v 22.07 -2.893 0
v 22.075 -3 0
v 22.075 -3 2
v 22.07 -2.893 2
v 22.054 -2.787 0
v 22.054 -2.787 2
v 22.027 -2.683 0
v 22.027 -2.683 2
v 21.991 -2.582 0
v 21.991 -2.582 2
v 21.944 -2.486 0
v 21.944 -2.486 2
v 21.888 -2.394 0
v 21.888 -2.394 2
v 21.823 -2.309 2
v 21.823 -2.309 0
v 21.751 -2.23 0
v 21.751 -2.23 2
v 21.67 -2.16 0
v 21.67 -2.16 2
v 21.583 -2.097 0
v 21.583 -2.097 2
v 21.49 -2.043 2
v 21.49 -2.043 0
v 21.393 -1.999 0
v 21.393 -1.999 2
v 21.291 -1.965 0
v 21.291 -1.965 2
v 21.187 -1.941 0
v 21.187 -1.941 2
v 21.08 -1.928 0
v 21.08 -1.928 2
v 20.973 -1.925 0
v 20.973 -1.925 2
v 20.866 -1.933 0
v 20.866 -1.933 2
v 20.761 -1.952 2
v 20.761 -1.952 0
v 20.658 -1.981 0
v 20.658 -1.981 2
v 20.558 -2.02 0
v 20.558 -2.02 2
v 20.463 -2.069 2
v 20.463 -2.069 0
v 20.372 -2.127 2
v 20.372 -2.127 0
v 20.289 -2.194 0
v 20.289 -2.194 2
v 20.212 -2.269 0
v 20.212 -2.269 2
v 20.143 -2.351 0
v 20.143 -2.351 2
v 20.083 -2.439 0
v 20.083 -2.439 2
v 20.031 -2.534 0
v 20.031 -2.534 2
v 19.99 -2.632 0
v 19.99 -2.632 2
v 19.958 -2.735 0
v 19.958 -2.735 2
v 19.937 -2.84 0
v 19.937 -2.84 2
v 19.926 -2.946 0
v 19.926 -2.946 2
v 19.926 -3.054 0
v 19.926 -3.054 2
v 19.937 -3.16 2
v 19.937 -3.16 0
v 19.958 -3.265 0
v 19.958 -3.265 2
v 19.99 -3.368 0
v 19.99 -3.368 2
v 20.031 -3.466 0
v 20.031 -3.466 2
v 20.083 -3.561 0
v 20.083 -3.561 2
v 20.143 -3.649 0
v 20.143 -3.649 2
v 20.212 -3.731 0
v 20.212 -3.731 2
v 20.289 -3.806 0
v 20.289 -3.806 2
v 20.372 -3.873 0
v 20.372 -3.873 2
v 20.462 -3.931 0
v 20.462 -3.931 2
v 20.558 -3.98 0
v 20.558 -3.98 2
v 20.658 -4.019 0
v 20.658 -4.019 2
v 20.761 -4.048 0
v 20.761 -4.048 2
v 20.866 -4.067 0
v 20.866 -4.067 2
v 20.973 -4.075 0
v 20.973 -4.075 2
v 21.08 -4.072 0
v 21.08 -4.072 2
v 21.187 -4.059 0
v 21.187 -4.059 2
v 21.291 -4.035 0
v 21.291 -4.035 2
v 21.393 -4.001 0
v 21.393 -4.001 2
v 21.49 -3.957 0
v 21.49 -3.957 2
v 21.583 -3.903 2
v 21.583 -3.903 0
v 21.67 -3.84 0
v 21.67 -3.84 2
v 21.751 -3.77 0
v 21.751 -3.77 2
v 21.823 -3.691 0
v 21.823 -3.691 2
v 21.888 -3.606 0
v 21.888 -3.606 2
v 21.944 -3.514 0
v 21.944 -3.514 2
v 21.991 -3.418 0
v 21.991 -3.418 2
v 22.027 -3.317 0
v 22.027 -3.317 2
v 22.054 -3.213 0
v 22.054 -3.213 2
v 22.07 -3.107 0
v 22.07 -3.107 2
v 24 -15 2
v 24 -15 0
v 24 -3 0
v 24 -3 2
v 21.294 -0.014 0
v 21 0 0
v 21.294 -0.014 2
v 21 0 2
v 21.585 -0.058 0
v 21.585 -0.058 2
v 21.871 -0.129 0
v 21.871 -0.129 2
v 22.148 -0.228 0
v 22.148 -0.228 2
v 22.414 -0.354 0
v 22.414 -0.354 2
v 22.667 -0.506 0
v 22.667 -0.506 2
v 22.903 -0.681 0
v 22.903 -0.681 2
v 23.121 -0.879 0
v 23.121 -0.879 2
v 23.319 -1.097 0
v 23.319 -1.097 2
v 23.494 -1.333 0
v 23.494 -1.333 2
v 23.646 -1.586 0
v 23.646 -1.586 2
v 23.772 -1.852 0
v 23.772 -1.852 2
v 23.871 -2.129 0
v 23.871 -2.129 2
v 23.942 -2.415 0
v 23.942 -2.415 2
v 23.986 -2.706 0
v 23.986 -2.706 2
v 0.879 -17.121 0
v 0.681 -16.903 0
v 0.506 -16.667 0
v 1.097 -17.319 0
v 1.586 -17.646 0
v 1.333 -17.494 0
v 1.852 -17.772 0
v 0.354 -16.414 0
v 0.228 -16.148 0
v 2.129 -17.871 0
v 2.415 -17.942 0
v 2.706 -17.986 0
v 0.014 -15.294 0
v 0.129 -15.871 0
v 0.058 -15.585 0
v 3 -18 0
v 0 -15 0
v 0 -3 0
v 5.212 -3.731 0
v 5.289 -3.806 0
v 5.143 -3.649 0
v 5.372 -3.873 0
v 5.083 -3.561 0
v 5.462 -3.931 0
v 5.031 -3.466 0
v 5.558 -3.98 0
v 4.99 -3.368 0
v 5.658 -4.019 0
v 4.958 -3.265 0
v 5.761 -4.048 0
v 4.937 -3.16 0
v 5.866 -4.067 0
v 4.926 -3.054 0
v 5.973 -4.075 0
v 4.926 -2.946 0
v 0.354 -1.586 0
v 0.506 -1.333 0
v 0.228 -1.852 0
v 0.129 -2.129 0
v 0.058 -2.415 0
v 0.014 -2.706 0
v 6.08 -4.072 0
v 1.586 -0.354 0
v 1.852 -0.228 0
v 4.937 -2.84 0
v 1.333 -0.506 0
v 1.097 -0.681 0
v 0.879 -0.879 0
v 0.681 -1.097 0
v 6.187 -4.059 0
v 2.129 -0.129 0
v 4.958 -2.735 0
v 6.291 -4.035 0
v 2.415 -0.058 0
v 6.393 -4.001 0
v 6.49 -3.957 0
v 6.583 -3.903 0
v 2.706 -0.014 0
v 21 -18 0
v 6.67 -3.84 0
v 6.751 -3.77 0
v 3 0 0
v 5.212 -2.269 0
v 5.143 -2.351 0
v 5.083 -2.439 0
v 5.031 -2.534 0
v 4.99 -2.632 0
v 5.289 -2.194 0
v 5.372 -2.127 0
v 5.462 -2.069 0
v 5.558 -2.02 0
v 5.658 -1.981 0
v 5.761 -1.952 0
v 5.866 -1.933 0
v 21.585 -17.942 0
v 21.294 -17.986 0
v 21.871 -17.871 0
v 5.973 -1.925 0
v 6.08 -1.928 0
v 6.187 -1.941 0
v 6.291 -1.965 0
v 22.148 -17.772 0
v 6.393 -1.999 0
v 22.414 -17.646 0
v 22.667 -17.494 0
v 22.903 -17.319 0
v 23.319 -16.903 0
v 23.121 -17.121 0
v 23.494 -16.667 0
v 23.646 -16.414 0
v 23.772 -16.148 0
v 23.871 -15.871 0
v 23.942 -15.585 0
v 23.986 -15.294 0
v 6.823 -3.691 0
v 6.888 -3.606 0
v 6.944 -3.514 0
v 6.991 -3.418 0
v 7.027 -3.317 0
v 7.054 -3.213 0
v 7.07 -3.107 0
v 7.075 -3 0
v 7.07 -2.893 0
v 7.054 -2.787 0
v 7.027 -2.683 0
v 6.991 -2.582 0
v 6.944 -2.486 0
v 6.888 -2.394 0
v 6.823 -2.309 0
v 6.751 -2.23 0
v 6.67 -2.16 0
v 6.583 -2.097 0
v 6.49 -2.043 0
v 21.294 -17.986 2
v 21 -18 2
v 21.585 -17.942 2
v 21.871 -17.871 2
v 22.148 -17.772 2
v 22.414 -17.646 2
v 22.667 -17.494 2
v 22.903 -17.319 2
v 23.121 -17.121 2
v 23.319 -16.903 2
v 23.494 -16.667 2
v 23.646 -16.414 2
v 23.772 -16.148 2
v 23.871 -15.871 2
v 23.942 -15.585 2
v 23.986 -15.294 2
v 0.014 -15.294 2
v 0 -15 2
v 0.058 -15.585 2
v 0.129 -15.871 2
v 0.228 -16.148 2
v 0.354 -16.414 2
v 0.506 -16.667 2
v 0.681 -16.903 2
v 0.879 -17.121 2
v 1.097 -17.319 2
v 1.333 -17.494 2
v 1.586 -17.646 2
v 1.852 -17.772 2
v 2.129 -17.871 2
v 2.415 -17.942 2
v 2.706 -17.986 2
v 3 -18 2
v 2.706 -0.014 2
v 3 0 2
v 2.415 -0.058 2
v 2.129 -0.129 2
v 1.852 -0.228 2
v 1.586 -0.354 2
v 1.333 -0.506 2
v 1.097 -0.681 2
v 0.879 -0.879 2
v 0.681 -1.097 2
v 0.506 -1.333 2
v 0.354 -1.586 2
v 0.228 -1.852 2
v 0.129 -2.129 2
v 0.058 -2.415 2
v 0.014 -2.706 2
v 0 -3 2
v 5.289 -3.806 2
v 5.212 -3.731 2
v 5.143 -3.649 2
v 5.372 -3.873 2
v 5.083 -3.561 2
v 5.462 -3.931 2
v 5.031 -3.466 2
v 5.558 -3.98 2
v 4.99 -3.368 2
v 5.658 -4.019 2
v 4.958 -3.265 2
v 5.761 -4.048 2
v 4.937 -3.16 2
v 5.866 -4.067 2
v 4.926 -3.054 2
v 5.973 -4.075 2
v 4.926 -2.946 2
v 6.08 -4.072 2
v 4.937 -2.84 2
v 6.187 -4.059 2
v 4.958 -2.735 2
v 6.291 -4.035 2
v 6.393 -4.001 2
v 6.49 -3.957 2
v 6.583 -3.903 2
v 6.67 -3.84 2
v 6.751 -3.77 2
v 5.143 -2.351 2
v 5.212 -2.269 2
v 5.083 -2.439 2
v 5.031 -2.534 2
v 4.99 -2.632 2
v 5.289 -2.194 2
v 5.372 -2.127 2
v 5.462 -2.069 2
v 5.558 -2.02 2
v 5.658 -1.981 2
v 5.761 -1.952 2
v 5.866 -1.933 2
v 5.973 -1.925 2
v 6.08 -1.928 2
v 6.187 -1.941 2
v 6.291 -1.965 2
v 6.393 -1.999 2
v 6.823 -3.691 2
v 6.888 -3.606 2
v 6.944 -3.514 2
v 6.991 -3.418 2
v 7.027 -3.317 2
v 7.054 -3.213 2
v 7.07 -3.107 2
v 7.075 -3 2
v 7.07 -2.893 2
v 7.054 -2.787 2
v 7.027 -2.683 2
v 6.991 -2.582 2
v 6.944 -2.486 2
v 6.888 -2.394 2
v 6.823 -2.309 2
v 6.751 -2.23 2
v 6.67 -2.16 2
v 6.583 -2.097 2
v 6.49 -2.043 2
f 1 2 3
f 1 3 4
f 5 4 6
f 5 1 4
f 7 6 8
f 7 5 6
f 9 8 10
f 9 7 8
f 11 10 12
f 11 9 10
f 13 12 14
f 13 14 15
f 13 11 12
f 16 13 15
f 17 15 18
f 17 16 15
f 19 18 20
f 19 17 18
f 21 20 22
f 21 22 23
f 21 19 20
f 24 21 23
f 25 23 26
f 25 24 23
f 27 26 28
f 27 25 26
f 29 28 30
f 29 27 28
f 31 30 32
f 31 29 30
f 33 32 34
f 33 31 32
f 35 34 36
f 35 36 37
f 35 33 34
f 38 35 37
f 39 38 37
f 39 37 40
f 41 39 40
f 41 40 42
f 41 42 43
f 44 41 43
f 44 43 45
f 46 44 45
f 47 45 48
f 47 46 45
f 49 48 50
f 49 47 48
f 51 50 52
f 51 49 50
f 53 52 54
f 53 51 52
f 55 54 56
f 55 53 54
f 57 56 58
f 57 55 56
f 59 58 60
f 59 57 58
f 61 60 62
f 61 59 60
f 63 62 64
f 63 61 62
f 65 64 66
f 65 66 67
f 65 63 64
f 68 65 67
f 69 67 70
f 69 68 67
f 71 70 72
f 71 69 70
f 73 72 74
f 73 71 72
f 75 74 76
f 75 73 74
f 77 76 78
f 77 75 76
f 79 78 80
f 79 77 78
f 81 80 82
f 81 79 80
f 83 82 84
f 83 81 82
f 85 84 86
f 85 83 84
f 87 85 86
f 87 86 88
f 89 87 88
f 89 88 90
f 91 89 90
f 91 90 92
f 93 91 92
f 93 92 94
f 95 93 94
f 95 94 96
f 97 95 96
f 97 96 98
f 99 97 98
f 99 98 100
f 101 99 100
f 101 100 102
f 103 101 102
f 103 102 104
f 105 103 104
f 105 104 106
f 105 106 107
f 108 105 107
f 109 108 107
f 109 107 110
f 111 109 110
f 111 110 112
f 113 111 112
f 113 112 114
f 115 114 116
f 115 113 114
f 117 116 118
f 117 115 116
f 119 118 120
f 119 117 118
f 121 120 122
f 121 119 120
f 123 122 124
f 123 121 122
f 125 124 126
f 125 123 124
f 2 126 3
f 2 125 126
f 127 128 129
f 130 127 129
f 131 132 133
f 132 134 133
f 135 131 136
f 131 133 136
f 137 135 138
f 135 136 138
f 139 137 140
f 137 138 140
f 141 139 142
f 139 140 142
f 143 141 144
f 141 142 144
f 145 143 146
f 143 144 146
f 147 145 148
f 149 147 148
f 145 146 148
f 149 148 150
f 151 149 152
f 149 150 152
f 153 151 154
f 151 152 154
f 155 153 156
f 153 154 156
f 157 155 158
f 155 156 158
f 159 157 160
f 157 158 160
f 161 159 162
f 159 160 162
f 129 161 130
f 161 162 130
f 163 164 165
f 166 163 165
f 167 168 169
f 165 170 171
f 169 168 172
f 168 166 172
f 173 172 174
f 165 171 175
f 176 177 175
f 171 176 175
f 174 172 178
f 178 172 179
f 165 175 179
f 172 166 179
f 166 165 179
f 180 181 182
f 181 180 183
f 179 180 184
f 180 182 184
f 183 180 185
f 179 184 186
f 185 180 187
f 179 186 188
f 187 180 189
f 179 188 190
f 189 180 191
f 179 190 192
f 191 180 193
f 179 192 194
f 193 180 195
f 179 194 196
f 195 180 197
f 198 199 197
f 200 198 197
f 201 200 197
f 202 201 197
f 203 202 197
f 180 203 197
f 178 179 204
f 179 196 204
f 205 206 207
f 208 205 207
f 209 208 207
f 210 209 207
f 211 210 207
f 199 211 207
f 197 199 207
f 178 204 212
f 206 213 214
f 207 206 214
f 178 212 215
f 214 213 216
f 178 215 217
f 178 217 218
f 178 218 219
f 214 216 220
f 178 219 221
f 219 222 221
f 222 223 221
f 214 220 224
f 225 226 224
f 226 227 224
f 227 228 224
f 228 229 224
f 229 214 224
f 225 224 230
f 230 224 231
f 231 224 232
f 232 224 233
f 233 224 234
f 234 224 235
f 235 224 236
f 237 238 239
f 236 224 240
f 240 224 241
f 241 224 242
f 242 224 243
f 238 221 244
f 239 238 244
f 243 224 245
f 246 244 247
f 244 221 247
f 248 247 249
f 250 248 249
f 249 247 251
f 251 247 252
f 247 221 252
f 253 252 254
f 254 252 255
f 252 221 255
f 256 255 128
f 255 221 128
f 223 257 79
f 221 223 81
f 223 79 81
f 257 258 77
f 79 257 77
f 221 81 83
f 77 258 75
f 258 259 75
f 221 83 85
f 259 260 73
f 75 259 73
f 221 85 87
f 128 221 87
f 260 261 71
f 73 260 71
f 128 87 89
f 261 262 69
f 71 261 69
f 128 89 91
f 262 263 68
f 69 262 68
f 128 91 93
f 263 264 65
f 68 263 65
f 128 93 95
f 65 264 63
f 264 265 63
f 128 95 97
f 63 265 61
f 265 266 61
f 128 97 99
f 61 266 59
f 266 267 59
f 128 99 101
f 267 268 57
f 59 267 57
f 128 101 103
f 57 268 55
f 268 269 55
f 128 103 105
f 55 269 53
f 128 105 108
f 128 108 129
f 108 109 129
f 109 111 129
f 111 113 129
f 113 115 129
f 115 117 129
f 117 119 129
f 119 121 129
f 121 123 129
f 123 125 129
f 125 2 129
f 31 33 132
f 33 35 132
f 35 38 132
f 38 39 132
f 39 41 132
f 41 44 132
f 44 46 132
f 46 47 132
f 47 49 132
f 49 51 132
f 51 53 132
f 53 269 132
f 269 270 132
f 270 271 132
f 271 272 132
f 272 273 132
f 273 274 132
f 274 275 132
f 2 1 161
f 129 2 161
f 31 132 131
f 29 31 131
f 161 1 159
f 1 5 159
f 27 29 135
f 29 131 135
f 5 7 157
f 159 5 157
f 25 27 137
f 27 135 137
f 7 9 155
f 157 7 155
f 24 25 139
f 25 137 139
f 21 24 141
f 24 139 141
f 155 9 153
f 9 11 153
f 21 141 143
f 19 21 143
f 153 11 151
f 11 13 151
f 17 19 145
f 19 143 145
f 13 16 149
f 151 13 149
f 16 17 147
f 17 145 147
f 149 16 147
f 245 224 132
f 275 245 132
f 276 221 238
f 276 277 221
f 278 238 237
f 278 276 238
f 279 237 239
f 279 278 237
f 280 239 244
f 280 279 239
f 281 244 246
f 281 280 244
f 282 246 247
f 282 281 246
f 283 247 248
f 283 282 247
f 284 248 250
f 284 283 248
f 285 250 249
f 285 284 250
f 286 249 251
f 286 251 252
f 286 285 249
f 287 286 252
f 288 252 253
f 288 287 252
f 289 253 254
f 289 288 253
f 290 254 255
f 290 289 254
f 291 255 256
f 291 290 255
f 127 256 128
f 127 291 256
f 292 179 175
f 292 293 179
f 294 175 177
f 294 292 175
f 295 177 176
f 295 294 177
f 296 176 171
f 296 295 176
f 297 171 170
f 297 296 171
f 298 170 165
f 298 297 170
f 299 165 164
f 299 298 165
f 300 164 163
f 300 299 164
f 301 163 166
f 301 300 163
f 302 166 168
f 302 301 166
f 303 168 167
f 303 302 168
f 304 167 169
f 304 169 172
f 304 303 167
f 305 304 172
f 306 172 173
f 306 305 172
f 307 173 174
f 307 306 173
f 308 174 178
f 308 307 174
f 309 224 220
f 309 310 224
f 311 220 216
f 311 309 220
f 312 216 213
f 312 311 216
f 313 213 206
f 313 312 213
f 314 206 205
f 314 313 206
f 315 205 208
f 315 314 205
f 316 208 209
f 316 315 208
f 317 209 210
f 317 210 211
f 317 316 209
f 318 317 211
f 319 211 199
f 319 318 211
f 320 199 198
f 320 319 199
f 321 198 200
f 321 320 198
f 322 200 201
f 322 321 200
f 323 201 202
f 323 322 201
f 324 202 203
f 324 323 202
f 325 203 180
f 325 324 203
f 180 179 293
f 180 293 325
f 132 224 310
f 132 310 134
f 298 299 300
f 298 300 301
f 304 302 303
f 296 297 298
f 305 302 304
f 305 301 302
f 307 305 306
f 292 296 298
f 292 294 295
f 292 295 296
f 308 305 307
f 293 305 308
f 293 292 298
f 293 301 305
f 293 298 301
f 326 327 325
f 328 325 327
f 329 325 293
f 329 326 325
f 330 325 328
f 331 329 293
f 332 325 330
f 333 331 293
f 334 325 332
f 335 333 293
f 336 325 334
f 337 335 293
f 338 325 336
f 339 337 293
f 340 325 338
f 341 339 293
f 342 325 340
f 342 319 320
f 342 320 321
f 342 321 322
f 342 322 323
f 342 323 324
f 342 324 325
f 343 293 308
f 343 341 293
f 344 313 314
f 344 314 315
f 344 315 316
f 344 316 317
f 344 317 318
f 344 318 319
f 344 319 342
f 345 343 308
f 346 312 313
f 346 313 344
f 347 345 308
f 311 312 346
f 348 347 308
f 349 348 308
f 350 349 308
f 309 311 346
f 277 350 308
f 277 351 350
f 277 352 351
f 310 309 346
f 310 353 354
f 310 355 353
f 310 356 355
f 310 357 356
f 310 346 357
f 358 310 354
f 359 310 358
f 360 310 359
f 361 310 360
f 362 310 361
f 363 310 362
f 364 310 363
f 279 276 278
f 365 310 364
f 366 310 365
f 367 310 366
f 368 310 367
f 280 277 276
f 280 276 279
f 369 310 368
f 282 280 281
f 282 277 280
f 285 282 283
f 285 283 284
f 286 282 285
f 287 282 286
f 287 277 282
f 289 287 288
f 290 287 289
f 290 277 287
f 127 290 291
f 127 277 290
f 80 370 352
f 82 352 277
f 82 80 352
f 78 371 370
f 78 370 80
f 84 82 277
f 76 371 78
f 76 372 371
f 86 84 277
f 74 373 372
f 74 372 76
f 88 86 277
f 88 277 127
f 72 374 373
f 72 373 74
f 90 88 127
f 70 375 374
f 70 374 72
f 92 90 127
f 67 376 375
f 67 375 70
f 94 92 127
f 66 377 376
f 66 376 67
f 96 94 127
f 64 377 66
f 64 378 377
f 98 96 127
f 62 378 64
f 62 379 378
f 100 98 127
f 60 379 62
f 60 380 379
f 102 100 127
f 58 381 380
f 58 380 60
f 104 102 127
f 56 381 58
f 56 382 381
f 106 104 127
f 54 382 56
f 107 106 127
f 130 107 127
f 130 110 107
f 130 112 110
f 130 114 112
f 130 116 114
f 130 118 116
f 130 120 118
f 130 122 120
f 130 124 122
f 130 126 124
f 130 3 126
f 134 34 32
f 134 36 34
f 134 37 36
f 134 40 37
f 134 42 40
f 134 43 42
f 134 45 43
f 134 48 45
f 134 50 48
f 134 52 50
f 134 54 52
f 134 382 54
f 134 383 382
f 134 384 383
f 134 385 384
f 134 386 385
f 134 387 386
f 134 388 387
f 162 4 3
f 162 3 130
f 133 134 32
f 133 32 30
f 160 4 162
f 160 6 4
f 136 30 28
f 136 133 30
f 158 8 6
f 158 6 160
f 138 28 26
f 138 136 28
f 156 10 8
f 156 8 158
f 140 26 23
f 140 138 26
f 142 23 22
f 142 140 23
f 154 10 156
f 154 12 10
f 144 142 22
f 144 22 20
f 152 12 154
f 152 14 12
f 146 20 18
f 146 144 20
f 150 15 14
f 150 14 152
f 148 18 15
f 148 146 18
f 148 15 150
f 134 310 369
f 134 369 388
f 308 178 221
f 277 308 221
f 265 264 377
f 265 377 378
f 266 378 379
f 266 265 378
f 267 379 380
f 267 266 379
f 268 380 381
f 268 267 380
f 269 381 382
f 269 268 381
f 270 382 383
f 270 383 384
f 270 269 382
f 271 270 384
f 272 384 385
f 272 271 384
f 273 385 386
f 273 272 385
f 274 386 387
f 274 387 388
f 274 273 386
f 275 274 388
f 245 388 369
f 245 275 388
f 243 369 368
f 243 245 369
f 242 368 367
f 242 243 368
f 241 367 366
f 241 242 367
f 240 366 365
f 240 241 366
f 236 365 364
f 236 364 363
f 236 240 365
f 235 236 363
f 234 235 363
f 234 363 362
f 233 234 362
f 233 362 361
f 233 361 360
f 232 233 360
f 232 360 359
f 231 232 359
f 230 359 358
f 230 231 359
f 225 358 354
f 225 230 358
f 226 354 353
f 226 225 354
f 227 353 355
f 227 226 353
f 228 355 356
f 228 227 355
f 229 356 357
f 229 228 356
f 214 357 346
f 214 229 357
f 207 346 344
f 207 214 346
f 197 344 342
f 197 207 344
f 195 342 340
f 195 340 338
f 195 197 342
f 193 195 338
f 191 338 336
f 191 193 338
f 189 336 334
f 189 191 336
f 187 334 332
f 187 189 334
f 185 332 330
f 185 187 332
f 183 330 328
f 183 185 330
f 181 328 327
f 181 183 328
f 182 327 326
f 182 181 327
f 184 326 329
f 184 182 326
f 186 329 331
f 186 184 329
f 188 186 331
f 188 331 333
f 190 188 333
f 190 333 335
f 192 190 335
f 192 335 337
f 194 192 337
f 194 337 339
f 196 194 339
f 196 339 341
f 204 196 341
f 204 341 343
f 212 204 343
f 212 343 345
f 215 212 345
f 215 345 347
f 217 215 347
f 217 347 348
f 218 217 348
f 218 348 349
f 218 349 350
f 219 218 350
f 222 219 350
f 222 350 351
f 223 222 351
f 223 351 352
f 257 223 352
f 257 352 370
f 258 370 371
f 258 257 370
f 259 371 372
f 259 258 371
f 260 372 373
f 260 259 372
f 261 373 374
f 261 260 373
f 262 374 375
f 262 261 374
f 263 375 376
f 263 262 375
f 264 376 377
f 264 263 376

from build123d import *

# Parameters (mm, degrees)
SKETCH_1_W      = 24
SKETCH_1_H      = 18
SKETCH_1_R      = 1.075
EXTRUDE_1_DEPTH = 2
FILLET_1_R      = 3
FILLET_2_R      = 3
FILLET_3_R      = 3
FILLET_4_R      = 3


with BuildPart() as part:
    # 草图1 → 凸台-拉伸1 (new body)
    with BuildSketch(Plane.XY):
        with Locations((12, -9)):
            Rectangle(SKETCH_1_W, SKETCH_1_H)
        with Locations((21, -3)):
            Circle(SKETCH_1_R, mode=Mode.SUBTRACT)
        with Locations((6, -3)):
            Circle(SKETCH_1_R, mode=Mode.SUBTRACT)
    extrude(amount=EXTRUDE_1_DEPTH)

    # 圆角1
    fillet_1_edges = [part.edges().sort_by_distance(p)[0] for p in [
        (24, 0, 1),
    ]]
    fillet(fillet_1_edges, radius=FILLET_1_R)

    # 圆角2
    fillet_2_edges = [part.edges().sort_by_distance(p)[0] for p in [
        (0, 0, 1),
    ]]
    fillet(fillet_2_edges, radius=FILLET_2_R)

    # 圆角3
    fillet_3_edges = [part.edges().sort_by_distance(p)[0] for p in [
        (0, -18, 1),
    ]]
    fillet(fillet_3_edges, radius=FILLET_3_R)

    # 圆角4
    fillet_4_edges = [part.edges().sort_by_distance(p)[0] for p in [
        (24, -18, 1),
    ]]
    fillet(fillet_4_edges, radius=FILLET_4_R)


solid = part.part
